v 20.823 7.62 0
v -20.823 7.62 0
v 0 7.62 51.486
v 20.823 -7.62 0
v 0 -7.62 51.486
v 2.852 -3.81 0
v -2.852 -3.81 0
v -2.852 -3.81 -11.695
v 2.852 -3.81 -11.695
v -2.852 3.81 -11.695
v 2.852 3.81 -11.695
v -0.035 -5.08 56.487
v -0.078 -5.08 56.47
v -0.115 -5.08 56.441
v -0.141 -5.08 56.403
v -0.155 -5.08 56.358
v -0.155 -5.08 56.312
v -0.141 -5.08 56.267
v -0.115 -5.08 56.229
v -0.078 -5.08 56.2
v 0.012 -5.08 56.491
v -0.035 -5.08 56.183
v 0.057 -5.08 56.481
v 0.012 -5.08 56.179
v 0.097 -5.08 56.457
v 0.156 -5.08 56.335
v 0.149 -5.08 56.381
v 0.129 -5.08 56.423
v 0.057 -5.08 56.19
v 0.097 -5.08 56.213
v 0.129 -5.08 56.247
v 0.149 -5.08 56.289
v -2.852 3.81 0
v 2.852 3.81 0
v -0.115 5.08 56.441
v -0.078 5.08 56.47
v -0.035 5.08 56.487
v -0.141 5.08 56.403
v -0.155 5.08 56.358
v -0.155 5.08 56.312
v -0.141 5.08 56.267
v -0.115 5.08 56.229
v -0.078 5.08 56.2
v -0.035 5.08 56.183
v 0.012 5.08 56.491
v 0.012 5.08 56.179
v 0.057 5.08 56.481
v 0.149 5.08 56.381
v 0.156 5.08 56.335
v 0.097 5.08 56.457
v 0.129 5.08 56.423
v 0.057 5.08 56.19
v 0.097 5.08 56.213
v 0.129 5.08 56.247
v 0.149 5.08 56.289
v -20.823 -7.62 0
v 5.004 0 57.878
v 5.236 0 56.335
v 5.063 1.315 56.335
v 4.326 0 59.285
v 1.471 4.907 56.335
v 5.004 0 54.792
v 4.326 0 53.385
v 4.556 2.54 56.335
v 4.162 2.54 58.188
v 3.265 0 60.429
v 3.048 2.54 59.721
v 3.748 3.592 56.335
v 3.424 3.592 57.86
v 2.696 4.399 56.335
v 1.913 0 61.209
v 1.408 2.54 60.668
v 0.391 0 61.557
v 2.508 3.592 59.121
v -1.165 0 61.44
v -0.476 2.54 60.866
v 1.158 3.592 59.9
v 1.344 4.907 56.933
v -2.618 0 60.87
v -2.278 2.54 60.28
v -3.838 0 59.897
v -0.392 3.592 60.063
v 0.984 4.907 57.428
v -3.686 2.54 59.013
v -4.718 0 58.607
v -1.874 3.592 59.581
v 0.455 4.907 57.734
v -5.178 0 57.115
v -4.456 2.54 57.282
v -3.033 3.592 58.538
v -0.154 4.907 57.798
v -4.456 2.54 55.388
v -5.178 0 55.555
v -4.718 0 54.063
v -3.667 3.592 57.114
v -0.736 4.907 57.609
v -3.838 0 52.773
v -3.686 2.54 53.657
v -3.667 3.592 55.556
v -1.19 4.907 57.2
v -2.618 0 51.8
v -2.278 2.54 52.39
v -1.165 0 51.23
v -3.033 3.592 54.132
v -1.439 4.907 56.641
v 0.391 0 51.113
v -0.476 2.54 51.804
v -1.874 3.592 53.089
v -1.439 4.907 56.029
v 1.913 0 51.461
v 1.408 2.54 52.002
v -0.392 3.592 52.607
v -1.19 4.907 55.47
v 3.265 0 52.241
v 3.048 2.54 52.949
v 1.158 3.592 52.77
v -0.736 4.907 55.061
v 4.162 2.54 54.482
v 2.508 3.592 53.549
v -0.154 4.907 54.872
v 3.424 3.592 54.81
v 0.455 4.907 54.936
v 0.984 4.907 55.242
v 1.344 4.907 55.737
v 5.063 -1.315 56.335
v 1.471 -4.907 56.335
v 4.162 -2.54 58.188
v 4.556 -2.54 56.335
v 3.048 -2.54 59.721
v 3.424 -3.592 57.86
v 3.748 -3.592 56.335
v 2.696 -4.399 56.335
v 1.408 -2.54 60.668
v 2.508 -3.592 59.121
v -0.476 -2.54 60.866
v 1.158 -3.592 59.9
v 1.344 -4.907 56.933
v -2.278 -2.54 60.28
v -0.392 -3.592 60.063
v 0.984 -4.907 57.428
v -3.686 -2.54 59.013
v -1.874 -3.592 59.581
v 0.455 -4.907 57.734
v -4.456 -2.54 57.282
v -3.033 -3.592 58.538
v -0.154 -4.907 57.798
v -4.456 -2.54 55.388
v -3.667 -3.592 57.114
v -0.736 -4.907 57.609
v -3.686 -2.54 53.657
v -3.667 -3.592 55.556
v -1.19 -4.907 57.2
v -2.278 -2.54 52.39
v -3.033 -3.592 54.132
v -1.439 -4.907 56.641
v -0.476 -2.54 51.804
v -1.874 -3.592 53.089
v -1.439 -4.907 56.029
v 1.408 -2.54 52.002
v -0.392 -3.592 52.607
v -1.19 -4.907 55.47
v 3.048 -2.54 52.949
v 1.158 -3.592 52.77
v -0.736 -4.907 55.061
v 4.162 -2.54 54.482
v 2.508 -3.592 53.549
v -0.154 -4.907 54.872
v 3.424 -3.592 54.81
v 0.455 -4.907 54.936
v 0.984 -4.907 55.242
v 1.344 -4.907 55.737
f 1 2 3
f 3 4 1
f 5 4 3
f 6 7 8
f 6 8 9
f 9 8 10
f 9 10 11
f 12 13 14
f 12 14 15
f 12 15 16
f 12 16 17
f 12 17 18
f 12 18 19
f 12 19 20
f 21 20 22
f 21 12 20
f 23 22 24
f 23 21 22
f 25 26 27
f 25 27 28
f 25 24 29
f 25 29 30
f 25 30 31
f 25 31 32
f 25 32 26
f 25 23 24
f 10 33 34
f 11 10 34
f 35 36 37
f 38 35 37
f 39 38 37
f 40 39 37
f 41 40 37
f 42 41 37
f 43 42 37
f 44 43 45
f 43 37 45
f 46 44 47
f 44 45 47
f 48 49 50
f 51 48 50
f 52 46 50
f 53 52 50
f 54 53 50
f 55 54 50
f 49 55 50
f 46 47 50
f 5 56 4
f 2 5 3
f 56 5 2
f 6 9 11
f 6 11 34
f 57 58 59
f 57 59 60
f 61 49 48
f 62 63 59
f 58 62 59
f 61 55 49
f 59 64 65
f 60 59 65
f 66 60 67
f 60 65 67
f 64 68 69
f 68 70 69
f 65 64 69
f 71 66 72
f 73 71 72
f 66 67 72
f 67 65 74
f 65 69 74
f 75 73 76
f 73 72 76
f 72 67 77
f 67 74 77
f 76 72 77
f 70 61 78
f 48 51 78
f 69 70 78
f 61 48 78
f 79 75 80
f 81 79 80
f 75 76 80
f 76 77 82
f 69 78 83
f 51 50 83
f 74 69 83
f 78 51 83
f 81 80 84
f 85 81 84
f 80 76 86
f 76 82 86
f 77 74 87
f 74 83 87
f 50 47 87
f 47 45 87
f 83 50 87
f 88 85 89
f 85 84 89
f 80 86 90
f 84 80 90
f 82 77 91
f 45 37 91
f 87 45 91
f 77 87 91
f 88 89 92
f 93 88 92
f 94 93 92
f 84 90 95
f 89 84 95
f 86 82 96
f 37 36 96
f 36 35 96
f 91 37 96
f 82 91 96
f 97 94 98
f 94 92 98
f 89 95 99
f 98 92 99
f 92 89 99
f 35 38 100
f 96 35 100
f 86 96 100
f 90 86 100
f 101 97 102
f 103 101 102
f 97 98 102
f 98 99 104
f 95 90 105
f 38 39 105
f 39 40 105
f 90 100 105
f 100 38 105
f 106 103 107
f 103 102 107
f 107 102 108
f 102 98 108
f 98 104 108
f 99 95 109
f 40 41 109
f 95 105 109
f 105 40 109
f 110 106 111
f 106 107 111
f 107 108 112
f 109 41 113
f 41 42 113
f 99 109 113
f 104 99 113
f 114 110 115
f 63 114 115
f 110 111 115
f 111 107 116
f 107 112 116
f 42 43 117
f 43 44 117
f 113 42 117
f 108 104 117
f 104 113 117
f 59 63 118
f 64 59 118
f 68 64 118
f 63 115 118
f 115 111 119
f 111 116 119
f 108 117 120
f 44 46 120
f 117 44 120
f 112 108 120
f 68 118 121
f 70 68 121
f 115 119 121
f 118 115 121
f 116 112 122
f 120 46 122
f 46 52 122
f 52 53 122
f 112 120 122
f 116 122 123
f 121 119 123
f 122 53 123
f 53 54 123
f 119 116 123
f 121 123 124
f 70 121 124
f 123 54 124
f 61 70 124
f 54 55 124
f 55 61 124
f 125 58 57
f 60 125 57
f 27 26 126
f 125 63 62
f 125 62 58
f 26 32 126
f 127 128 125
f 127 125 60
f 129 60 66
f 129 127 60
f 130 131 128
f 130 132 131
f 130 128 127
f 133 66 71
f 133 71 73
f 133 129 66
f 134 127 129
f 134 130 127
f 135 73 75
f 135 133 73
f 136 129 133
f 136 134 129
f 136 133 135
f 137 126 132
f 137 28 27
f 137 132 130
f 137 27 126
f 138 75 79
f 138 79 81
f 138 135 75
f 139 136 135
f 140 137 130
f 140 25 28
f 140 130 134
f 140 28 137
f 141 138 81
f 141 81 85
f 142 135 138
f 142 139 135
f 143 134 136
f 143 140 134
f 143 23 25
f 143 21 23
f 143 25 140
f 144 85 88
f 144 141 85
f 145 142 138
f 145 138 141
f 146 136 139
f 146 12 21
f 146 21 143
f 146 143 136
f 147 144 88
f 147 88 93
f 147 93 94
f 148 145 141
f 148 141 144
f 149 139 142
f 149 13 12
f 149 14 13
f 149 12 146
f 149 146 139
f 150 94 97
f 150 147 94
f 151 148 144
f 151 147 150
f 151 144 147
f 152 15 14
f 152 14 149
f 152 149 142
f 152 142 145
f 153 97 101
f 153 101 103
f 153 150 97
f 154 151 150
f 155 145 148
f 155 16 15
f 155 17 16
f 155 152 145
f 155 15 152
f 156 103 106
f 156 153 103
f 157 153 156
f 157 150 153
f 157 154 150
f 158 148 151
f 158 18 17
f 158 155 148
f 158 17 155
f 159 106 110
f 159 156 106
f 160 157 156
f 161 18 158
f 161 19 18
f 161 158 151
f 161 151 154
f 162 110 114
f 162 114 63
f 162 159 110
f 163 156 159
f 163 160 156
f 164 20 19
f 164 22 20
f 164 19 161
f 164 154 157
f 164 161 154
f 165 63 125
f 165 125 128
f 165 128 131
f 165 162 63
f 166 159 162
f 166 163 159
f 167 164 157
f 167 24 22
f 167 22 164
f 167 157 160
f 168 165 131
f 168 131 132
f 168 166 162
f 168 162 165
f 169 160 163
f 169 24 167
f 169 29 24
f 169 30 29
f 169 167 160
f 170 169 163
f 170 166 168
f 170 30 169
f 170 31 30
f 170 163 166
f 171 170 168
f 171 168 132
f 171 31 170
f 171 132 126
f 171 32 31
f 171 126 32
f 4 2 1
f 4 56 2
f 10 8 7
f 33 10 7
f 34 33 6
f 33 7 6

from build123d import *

# Parameters (mm, degrees)
F0_R     = 5.2363216072
F3_DEPTH = 5.08
F4_R     = 5.07999
F2_W     = 5.7048136368
F2_H     = 11.6948671639
F6_DEPTH = 3.81
F7_DEPTH = 7.62


# Not quite as in the source:
# - a fillet or chamfer is up to 0.001 mm smaller than in the source, because OpenCascade refuses the exact size


with BuildPart() as f3:
    # F0 (on Front) → F3 (new body)
    with BuildSketch(Plane.XZ):
        with Locations((0, 56.3350282609)):
            Circle(F0_R)
    extrude(amount=F3_DEPTH)

    # F4 (radius 5.08 in the source; OpenCascade refuses exactly that, so slightly less here)
    f4_edges = [f3.edges().sort_by_distance(p)[0] for p in [
        (-5.236322, -5.08, 56.335028),
    ]]
    fillet(f4_edges, radius=F4_R)

    # F5: F3 across plane


with BuildPart() as f3_1:
    add(f3.part)
    add(f3.part.mirror(Plane.XZ))


with BuildPart() as f6:
    # F2 (on Front) → F6 (new body, symmetric)
    with BuildSketch(Plane.XZ):
        with Locations((0, -5.8474335819)):
            Rectangle(F2_W, F2_H)
    extrude(amount=F6_DEPTH, both=True)


with BuildPart() as f7:
    # F1 (on Front) → F7 (new body, symmetric)
    with BuildSketch(Plane.XZ):
        Polygon((20.8225678653, 0), (0, 51.4859370887), (-20.8225660026, 0), align=None)
    extrude(amount=F7_DEPTH, both=True)


solid = Compound([f3_1.part, f6.part, f7.part])
